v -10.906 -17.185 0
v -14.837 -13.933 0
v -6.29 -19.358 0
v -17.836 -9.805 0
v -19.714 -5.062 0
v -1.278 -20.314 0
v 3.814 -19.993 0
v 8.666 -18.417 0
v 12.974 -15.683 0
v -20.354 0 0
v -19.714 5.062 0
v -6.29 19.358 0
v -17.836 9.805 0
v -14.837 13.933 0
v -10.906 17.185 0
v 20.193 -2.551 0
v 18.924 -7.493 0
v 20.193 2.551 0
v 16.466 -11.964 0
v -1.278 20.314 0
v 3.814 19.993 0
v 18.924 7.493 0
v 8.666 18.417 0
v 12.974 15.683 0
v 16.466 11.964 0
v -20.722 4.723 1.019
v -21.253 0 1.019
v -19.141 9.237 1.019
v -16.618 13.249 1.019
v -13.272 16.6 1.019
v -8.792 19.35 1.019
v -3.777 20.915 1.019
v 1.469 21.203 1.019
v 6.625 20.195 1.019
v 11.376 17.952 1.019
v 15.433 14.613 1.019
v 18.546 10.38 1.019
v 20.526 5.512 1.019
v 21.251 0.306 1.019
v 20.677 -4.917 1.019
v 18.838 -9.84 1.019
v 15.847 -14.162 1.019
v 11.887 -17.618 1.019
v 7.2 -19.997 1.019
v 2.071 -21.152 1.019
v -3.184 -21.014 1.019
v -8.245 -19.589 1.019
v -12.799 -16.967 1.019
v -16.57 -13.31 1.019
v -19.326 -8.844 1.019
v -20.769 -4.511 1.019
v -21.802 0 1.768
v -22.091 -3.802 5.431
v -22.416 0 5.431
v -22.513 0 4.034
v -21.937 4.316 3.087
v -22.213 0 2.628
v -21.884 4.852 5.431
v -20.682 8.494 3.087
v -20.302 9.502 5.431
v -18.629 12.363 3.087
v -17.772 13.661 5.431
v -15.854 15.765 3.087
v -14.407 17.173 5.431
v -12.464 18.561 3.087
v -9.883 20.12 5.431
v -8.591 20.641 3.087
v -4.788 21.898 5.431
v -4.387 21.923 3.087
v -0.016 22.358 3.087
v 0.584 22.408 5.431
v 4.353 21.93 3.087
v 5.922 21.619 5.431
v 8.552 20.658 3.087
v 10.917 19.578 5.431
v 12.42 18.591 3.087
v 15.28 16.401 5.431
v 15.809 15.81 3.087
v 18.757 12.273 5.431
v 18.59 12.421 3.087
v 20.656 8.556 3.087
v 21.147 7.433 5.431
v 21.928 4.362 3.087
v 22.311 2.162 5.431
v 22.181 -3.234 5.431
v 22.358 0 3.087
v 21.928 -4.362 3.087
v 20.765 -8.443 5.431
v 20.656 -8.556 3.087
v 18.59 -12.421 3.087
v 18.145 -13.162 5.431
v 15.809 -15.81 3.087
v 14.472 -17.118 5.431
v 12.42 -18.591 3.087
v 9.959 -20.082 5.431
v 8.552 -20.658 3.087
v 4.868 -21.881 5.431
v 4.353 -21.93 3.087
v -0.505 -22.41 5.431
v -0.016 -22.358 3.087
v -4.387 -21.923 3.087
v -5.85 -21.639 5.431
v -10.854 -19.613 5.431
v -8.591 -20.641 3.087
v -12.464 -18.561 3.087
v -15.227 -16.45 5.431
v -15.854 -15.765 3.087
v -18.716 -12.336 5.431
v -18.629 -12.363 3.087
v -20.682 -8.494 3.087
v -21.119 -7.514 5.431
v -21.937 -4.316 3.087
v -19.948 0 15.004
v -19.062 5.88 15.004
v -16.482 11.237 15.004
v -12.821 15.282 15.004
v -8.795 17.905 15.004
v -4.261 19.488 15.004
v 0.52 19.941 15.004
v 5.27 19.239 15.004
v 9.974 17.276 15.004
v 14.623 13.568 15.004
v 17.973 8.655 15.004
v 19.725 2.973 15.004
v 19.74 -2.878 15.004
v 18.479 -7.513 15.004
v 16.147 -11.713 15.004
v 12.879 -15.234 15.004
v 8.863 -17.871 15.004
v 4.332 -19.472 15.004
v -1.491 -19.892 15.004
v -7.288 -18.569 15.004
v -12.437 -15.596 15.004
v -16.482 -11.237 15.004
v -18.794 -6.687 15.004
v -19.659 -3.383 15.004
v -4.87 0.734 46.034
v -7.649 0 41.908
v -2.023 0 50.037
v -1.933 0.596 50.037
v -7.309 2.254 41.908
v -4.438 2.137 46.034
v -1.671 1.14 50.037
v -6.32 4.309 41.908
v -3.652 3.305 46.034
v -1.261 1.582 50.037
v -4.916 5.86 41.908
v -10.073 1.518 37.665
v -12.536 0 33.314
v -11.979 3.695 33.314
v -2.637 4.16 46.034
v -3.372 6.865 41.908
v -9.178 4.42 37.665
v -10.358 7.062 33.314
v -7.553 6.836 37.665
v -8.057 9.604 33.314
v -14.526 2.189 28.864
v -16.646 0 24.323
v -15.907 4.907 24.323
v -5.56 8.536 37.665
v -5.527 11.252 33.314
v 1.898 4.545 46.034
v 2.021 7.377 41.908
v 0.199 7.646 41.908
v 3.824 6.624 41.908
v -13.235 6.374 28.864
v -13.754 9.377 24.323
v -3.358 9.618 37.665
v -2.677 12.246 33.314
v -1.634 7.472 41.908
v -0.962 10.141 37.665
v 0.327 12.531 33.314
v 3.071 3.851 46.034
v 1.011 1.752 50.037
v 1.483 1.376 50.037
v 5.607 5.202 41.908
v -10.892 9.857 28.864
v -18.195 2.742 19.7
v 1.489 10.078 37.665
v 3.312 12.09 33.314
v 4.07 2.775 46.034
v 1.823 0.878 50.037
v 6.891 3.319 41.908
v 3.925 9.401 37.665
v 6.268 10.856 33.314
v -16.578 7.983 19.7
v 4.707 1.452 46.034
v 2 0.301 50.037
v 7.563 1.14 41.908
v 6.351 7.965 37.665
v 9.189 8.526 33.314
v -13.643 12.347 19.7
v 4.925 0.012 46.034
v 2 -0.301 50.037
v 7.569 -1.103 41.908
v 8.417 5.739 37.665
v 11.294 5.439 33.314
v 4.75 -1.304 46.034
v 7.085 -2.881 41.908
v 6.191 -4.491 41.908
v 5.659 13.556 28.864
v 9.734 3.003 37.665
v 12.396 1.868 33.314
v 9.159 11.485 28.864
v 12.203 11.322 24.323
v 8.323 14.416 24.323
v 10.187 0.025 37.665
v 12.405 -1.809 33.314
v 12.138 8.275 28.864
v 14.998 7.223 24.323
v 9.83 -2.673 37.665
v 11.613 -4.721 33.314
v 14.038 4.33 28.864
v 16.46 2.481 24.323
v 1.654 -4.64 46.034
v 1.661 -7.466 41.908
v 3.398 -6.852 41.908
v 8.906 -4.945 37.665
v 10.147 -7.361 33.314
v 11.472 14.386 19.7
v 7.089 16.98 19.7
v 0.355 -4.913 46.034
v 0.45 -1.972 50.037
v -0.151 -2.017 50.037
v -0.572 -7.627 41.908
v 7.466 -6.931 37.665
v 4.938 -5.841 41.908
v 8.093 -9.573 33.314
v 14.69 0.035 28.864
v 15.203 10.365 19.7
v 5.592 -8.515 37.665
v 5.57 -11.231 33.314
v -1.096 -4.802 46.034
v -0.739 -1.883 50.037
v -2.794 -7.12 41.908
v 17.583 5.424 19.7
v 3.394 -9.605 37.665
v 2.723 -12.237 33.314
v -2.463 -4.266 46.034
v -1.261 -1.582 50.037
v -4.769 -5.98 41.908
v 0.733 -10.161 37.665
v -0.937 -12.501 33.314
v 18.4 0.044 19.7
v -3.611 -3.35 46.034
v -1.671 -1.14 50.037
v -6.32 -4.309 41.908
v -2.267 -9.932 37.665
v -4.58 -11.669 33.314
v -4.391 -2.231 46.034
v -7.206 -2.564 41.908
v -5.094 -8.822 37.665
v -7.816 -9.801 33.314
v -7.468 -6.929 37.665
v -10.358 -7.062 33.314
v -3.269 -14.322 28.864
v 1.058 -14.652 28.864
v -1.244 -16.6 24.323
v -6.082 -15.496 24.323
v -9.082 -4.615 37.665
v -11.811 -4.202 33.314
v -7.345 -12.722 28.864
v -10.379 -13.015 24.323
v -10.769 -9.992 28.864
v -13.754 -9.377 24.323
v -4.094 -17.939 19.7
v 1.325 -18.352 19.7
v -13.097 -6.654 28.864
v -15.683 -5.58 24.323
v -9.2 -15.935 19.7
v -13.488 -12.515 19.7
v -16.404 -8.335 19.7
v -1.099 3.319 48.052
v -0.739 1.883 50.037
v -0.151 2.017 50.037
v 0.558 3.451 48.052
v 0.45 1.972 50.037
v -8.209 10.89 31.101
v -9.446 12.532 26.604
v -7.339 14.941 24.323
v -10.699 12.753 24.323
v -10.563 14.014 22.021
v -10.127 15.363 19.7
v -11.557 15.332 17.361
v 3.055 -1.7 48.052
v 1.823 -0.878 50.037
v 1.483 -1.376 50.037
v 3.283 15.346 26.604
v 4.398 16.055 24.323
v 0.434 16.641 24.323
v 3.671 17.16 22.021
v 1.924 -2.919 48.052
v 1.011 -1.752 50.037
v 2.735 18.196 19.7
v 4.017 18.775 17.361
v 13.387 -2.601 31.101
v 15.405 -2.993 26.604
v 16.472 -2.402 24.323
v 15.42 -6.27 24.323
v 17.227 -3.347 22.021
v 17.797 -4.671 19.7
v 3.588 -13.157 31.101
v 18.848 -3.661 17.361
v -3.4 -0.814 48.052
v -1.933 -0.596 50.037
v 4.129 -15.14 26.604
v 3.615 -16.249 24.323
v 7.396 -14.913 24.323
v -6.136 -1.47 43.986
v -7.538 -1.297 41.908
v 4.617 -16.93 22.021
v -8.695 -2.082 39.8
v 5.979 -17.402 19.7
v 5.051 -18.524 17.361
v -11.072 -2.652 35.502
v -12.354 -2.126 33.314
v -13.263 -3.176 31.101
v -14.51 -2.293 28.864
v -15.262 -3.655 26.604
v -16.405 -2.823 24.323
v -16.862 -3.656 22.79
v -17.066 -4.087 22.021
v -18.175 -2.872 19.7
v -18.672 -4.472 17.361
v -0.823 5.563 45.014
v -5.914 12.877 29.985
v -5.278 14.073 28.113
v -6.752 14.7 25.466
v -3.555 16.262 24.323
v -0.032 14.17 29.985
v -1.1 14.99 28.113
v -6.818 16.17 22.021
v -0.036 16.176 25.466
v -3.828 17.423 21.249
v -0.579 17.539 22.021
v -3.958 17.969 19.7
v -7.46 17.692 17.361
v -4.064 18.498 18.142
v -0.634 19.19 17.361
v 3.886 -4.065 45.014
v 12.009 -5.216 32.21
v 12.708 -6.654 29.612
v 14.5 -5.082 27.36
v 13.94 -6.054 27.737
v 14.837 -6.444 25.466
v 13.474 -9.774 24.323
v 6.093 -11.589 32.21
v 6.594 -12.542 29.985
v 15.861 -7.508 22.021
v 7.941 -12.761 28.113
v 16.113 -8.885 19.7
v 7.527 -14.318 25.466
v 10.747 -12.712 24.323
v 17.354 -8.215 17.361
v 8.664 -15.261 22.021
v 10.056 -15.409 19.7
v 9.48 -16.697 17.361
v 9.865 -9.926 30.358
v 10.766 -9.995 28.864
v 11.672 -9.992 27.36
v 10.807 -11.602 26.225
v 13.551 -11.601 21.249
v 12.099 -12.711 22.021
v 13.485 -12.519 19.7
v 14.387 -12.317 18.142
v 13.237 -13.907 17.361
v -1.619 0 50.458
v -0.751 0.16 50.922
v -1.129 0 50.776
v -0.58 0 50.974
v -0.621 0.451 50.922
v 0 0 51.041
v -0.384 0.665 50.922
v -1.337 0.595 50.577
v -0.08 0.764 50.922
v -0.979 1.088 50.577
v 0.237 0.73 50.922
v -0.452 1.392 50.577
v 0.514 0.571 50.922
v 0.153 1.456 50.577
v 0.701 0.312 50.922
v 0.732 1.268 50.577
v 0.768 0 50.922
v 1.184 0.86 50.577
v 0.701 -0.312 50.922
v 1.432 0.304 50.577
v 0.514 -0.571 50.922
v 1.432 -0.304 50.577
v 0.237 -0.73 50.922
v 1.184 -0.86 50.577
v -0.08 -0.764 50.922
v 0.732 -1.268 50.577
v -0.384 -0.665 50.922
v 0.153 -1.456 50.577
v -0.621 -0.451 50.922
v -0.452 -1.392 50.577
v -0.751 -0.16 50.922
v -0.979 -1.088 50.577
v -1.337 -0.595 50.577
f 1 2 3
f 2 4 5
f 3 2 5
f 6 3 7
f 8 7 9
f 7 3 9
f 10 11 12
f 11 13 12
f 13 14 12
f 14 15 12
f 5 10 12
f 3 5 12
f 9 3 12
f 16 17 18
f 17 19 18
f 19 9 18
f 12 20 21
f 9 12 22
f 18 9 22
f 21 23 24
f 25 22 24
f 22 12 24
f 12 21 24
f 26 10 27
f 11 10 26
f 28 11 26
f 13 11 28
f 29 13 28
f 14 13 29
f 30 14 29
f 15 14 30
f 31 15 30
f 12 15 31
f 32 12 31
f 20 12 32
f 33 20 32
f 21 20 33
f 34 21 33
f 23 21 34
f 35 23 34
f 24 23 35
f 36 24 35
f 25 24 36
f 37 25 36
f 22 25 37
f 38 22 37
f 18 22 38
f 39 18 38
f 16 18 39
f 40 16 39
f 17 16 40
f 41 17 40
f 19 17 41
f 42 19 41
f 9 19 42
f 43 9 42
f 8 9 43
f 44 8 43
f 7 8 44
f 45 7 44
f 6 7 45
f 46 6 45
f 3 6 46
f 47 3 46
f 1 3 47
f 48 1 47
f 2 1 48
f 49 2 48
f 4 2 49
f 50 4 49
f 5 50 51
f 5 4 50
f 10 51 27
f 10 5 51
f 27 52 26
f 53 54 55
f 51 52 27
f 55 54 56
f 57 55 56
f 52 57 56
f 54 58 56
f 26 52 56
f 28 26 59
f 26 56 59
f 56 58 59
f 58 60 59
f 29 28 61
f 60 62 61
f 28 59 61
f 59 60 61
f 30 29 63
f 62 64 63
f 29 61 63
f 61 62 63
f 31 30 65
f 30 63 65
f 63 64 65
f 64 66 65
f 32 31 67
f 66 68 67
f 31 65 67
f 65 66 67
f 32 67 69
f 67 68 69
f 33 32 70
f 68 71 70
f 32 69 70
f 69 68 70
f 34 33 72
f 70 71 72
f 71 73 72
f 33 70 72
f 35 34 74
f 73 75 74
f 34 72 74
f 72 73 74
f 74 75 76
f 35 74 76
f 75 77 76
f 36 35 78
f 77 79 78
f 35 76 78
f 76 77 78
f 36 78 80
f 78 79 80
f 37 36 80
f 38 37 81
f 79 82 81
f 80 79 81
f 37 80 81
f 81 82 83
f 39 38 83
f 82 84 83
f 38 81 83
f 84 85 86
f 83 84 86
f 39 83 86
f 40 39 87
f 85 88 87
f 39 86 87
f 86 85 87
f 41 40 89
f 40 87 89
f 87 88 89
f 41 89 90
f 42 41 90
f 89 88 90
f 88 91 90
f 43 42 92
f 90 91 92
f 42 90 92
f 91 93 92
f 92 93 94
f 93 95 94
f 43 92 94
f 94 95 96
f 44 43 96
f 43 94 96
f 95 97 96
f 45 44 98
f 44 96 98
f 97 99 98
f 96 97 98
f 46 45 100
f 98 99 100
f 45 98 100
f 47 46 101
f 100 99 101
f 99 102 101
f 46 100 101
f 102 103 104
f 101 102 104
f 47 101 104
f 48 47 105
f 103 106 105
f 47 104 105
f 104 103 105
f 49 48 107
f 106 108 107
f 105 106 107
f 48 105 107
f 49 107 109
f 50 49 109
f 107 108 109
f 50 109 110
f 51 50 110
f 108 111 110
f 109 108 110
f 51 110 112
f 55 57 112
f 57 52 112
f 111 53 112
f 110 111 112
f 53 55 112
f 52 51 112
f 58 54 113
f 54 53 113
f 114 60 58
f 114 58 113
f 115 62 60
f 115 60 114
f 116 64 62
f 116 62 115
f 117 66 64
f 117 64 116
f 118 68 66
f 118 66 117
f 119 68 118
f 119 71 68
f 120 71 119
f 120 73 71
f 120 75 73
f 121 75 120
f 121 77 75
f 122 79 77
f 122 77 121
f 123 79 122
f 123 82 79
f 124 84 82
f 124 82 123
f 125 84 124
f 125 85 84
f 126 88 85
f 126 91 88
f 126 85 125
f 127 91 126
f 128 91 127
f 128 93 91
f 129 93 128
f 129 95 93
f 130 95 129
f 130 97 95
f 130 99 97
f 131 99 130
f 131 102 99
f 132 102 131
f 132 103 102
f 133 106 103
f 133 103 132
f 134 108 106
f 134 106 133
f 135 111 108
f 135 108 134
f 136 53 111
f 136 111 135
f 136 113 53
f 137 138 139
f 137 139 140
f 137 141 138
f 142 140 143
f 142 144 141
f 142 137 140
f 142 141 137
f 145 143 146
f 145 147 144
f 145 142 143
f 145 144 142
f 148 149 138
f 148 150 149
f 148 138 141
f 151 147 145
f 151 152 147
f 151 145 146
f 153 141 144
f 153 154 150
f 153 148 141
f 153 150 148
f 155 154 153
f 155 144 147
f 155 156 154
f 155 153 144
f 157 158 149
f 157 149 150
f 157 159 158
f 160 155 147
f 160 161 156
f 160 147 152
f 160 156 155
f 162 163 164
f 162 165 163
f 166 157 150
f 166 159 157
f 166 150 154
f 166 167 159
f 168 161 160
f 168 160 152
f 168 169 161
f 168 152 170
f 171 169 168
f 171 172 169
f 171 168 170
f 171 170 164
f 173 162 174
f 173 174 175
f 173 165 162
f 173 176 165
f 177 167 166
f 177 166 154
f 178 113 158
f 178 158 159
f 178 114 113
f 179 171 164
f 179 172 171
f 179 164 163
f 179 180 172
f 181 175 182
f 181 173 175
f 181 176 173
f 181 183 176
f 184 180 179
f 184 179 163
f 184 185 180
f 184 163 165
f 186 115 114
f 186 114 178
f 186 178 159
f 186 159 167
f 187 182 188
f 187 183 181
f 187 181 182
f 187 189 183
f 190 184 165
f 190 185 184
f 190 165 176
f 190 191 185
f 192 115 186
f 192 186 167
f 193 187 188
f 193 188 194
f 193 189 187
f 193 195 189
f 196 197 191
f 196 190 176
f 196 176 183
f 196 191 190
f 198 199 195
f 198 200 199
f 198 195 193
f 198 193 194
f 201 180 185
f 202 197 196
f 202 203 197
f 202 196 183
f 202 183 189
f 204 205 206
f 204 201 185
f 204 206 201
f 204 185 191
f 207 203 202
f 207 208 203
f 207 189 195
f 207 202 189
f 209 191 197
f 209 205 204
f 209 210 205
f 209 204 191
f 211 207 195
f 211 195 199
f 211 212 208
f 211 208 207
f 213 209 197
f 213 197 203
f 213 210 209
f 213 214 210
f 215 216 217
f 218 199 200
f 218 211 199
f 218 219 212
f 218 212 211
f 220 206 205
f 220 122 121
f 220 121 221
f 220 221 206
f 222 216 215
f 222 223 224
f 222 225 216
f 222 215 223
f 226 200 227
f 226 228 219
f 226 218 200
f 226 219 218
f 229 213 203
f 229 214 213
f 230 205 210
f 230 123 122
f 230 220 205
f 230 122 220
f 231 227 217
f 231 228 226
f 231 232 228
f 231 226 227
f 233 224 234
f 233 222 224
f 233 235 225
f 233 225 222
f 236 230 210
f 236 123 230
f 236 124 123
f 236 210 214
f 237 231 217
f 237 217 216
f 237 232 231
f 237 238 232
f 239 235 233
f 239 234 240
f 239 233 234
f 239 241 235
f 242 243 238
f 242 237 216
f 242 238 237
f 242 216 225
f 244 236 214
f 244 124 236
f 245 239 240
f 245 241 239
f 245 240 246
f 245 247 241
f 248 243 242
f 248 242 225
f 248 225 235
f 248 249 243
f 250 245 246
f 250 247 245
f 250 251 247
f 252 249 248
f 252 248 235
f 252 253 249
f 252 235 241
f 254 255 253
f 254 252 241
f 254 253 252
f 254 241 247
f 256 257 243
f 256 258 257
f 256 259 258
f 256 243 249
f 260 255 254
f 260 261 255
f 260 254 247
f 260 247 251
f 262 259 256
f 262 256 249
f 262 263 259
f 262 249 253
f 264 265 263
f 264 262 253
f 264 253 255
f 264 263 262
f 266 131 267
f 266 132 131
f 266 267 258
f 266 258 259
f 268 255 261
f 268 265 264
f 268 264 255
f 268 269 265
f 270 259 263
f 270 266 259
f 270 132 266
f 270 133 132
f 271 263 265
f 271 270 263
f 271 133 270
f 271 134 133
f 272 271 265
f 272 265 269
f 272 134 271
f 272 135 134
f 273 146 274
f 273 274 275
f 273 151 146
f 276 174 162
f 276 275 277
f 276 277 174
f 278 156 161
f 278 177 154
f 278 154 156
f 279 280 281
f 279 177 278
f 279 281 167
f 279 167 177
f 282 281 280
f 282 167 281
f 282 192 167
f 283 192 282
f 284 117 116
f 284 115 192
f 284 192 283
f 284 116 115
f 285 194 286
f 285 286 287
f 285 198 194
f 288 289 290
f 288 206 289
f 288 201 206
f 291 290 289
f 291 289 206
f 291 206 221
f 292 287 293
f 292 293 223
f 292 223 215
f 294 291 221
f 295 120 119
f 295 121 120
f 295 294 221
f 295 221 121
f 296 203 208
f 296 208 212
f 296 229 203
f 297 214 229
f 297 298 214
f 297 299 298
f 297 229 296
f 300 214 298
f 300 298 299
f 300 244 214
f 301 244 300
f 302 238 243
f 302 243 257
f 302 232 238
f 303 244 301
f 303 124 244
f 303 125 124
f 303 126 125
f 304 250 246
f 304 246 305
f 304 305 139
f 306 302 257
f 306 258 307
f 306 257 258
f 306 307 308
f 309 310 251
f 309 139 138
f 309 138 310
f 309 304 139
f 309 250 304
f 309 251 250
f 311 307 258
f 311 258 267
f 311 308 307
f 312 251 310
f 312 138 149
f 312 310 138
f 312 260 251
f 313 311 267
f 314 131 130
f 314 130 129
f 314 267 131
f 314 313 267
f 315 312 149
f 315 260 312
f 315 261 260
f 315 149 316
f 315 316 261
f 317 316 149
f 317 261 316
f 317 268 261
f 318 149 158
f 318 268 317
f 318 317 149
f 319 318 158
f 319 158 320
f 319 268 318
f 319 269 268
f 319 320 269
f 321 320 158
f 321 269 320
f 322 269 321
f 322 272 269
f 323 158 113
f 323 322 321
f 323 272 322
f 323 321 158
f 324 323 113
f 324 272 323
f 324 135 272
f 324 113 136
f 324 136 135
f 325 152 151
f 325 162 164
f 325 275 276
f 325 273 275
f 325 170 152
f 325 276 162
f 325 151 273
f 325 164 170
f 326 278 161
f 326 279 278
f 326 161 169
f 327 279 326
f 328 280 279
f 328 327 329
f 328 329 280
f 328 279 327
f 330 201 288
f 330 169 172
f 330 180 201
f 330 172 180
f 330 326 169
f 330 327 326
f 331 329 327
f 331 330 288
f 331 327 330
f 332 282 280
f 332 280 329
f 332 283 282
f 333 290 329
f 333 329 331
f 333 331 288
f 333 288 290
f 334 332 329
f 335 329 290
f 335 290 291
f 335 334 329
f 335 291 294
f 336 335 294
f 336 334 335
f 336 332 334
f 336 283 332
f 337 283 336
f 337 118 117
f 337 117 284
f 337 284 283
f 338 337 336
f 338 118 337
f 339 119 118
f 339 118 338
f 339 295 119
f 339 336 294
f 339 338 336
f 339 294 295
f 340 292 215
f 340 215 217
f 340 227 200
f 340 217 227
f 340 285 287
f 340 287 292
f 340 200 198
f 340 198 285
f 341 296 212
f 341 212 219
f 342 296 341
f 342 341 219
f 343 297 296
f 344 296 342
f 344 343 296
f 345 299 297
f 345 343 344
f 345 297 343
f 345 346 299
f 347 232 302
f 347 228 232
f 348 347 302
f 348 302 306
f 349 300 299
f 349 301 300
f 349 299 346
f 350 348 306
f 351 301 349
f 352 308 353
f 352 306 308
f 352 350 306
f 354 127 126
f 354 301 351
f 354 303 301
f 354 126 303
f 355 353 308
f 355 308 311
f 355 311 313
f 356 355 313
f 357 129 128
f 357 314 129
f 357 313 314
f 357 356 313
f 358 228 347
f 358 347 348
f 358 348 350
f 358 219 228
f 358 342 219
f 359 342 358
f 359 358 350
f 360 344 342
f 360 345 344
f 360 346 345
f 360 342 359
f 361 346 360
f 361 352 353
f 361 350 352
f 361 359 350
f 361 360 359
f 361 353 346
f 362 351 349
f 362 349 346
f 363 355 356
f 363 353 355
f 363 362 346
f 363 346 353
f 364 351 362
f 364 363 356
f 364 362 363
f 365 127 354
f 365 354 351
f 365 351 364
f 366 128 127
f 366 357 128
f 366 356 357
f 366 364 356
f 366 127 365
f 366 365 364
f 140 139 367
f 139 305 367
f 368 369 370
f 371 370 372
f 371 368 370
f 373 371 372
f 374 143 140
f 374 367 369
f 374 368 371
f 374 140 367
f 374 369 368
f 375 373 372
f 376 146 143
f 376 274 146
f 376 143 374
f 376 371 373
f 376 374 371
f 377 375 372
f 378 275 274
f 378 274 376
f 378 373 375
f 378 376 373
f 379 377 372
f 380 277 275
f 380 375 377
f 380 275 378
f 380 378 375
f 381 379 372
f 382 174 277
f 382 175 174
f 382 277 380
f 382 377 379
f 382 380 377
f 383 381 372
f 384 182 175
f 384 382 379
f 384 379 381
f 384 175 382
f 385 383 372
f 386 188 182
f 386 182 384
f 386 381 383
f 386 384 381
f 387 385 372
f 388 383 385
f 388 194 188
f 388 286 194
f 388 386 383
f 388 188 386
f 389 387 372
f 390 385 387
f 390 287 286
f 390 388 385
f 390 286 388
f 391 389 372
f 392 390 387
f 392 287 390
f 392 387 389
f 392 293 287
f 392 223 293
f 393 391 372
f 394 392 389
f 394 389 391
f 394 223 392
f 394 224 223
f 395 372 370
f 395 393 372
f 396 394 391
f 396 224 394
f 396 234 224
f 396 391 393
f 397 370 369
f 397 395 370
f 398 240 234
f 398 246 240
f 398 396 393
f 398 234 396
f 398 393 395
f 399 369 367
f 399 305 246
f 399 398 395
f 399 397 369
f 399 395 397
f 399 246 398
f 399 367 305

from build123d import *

# Parameters (mm, degrees)
F2_R     = 36.1372646231
F3_DEPTH = 25.4
F5_R     = 5.08


# Not quite as in the source:
# - a fillet or chamfer that OpenCascade refuses, or shapes differently, is made with other operations: its cross-section is extruded or revolved along the edge and cut away or added


with BuildPart() as f1:
    # F0 (on Front) → F1 (revolve)
    with BuildSketch(Plane.XZ):
        with BuildLine():
            ThreePointArc((-2.0228388078, 50.0369316611), (-14.8680259182, 28.4727741092), (-22.5899603778, 4.5900721886))
            ThreePointArc((-22.5899603778, 4.5900721886), (-17.8491381046, -14.5870950326), (0, -23.0515741884))
            Line((0, -23.0515741884), (0, 51.0407926186))
            ThreePointArc((0, 51.0407926186), (-1.1291162102, 50.7760281194), (-2.0228388078, 50.0369316611))
        make_face()
    revolve(axis=Axis((0, 0, 13.9946092151), (0, 0, -1)))

    # F2 (on Top) → F3 (cut)
    with BuildSketch(Plane.XY):
        Circle(F2_R)
    extrude(amount=-F3_DEPTH, mode=Mode.SUBTRACT)

    # F4: chamfer of 2.54 on 1 edges, made by hand

    # F4_s1 → F4_t2 (revolve, cut)
    with BuildSketch(Plane.XZ):
        with BuildLine():
            Line((-22.8741492677, 2.8545346106), (-20.3536993121, 0))
            Line((-20.3536993121, 0), (-23.0515741884, 0))
            ThreePointArc((-23.0515741884, 0), (-23.0049180414, 1.4658848771), (-22.8741492677, 2.8545346106))
        make_face()
    revolve(axis=Axis((0, 0, 0), (0, 0, -1)), mode=Mode.SUBTRACT)

    # F5
    f5_edges = [f1.edges().sort_by_distance(p)[0] for p in [
        (22.874149, 0, 2.854535),
    ]]
    fillet(f5_edges, radius=F5_R)


solid = f1.part
